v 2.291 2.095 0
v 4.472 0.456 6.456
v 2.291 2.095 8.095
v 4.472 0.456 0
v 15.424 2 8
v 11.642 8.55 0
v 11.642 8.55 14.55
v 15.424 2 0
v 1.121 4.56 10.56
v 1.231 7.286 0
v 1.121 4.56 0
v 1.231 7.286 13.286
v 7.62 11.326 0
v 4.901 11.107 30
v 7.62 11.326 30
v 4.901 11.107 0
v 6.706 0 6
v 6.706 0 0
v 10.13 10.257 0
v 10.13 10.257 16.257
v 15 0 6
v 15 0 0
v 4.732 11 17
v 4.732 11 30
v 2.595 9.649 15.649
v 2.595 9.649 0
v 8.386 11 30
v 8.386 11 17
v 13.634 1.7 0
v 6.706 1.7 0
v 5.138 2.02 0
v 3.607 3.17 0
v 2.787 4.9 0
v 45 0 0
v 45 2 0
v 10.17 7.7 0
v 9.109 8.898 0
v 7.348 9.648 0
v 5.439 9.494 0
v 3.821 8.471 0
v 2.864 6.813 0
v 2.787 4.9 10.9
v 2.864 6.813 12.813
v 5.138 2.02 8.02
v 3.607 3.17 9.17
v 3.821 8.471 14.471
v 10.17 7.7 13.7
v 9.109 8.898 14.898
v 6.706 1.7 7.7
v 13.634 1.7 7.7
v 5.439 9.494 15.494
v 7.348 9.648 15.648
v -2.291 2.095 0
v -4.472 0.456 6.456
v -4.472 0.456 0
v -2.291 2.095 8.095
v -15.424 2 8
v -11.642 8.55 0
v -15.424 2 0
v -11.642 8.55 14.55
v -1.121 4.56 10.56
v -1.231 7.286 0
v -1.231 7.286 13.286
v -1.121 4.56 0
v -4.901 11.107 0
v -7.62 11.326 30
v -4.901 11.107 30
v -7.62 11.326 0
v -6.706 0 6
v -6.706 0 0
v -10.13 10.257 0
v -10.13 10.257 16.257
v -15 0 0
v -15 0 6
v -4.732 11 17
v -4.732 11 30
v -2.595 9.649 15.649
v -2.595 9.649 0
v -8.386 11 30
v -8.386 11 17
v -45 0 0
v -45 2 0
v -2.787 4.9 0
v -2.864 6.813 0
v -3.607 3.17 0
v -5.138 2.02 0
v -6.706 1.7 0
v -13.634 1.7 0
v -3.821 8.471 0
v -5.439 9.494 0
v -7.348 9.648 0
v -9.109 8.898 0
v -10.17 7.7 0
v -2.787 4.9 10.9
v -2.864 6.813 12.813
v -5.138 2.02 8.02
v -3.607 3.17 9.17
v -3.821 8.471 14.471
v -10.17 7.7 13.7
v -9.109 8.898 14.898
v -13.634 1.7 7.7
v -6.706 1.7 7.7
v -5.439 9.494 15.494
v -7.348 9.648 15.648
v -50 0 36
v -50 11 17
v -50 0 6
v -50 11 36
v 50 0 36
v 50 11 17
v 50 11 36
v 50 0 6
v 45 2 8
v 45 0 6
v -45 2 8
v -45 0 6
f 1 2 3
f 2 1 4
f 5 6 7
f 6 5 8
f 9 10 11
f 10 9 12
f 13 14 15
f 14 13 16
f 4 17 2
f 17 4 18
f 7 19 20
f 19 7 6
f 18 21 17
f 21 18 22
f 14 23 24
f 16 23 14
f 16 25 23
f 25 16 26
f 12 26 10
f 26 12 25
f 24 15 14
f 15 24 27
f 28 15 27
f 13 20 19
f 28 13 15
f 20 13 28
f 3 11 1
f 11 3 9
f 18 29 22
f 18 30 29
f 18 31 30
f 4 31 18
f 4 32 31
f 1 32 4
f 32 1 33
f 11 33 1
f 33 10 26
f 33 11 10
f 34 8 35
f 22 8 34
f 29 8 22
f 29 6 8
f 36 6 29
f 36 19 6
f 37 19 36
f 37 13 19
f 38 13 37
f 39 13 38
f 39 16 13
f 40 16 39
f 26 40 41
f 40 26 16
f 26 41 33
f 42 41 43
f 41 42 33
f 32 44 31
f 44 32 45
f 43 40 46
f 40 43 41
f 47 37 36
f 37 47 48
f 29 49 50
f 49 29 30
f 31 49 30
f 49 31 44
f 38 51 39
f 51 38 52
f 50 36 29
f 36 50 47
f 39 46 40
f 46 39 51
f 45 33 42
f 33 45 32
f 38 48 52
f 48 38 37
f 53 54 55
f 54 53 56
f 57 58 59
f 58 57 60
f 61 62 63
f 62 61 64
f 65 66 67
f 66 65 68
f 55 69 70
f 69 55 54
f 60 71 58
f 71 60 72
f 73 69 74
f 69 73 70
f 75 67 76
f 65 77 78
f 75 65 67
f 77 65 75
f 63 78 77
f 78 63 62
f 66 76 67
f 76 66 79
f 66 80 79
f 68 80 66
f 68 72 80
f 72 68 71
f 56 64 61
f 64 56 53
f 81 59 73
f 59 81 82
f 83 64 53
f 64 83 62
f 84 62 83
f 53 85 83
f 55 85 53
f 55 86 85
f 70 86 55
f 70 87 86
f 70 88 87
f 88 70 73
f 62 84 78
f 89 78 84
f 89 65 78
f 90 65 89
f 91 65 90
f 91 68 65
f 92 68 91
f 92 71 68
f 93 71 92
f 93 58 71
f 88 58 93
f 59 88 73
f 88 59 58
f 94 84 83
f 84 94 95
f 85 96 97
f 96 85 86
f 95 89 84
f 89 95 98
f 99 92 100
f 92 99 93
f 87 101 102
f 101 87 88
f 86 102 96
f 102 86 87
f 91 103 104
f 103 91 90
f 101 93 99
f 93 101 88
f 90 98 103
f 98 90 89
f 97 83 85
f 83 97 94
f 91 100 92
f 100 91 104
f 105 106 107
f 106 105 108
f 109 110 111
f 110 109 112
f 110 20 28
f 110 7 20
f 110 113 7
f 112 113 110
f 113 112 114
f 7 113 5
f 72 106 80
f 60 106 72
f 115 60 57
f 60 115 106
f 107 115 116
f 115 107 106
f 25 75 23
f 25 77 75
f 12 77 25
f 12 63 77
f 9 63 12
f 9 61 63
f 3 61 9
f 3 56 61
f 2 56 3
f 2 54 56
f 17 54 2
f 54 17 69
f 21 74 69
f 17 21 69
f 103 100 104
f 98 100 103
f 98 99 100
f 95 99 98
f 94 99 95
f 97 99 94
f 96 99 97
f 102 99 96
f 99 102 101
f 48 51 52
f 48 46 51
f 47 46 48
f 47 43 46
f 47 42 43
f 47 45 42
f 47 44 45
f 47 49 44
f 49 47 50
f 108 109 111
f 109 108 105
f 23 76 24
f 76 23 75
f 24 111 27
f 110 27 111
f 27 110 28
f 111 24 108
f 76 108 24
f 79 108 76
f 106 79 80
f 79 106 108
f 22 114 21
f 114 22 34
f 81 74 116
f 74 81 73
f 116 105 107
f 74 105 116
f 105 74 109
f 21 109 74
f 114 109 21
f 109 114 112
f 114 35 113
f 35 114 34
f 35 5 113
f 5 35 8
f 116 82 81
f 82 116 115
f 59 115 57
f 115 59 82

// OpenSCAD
//Author: Swift Geek
//Inspired by: https://www.thingiverse.com/thing:886421
//Disclaimer: This module is tested for GT2
//To make it work with other cables change:
// belt_single, belt_double
//Change drop_distance to better fit design

belt_single=1.7; // single timing belt thickness
belt_double=2; // thickness of two timing belts locked together by their teeth
drop_distance=2; //distance between inverted drops
scale_factor=(8+belt_single*2)/8; // do not change

module drop(){
    rotate ([0,0,-30]) hull () {
        translate([-4,0,0]) cylinder (h=30, r=4); // a bit more $fn could be useful
        cylinder (h=30, r=4, $fn=3);  // should be h=8 in end product
    }
}

module inverted_drop() {
    difference () {
        translate ([-(belt_single/2/sqrt(3))+(2*belt_single/sqrt(3)),
            belt_single/2-belt_single])
            scale([scale_factor,scale_factor]) drop();
        drop();
    }
}

module inverted_holder () {
    translate ([7.47+belt_single+drop_distance/2,2+belt_single])inverted_drop();
    translate ([14+drop_distance/2,0]) cube ([30,belt_double,30]);
    mirror ([1,0,0]) translate ([7.47+belt_single+drop_distance/2,2+belt_single])
        inverted_drop();
    mirror ([1,0,0]) translate ([14+drop_distance/2,0]) cube ([30,belt_double,30]);
    // Ridge for easier belt insertion 
    translate ([-50,0,6]) intersection() {
            rotate ([45,0,0]) cube ([100,100,100]);
            cube ([100,11,30]);
    }
}
//inverted_drop();
inverted_holder();
